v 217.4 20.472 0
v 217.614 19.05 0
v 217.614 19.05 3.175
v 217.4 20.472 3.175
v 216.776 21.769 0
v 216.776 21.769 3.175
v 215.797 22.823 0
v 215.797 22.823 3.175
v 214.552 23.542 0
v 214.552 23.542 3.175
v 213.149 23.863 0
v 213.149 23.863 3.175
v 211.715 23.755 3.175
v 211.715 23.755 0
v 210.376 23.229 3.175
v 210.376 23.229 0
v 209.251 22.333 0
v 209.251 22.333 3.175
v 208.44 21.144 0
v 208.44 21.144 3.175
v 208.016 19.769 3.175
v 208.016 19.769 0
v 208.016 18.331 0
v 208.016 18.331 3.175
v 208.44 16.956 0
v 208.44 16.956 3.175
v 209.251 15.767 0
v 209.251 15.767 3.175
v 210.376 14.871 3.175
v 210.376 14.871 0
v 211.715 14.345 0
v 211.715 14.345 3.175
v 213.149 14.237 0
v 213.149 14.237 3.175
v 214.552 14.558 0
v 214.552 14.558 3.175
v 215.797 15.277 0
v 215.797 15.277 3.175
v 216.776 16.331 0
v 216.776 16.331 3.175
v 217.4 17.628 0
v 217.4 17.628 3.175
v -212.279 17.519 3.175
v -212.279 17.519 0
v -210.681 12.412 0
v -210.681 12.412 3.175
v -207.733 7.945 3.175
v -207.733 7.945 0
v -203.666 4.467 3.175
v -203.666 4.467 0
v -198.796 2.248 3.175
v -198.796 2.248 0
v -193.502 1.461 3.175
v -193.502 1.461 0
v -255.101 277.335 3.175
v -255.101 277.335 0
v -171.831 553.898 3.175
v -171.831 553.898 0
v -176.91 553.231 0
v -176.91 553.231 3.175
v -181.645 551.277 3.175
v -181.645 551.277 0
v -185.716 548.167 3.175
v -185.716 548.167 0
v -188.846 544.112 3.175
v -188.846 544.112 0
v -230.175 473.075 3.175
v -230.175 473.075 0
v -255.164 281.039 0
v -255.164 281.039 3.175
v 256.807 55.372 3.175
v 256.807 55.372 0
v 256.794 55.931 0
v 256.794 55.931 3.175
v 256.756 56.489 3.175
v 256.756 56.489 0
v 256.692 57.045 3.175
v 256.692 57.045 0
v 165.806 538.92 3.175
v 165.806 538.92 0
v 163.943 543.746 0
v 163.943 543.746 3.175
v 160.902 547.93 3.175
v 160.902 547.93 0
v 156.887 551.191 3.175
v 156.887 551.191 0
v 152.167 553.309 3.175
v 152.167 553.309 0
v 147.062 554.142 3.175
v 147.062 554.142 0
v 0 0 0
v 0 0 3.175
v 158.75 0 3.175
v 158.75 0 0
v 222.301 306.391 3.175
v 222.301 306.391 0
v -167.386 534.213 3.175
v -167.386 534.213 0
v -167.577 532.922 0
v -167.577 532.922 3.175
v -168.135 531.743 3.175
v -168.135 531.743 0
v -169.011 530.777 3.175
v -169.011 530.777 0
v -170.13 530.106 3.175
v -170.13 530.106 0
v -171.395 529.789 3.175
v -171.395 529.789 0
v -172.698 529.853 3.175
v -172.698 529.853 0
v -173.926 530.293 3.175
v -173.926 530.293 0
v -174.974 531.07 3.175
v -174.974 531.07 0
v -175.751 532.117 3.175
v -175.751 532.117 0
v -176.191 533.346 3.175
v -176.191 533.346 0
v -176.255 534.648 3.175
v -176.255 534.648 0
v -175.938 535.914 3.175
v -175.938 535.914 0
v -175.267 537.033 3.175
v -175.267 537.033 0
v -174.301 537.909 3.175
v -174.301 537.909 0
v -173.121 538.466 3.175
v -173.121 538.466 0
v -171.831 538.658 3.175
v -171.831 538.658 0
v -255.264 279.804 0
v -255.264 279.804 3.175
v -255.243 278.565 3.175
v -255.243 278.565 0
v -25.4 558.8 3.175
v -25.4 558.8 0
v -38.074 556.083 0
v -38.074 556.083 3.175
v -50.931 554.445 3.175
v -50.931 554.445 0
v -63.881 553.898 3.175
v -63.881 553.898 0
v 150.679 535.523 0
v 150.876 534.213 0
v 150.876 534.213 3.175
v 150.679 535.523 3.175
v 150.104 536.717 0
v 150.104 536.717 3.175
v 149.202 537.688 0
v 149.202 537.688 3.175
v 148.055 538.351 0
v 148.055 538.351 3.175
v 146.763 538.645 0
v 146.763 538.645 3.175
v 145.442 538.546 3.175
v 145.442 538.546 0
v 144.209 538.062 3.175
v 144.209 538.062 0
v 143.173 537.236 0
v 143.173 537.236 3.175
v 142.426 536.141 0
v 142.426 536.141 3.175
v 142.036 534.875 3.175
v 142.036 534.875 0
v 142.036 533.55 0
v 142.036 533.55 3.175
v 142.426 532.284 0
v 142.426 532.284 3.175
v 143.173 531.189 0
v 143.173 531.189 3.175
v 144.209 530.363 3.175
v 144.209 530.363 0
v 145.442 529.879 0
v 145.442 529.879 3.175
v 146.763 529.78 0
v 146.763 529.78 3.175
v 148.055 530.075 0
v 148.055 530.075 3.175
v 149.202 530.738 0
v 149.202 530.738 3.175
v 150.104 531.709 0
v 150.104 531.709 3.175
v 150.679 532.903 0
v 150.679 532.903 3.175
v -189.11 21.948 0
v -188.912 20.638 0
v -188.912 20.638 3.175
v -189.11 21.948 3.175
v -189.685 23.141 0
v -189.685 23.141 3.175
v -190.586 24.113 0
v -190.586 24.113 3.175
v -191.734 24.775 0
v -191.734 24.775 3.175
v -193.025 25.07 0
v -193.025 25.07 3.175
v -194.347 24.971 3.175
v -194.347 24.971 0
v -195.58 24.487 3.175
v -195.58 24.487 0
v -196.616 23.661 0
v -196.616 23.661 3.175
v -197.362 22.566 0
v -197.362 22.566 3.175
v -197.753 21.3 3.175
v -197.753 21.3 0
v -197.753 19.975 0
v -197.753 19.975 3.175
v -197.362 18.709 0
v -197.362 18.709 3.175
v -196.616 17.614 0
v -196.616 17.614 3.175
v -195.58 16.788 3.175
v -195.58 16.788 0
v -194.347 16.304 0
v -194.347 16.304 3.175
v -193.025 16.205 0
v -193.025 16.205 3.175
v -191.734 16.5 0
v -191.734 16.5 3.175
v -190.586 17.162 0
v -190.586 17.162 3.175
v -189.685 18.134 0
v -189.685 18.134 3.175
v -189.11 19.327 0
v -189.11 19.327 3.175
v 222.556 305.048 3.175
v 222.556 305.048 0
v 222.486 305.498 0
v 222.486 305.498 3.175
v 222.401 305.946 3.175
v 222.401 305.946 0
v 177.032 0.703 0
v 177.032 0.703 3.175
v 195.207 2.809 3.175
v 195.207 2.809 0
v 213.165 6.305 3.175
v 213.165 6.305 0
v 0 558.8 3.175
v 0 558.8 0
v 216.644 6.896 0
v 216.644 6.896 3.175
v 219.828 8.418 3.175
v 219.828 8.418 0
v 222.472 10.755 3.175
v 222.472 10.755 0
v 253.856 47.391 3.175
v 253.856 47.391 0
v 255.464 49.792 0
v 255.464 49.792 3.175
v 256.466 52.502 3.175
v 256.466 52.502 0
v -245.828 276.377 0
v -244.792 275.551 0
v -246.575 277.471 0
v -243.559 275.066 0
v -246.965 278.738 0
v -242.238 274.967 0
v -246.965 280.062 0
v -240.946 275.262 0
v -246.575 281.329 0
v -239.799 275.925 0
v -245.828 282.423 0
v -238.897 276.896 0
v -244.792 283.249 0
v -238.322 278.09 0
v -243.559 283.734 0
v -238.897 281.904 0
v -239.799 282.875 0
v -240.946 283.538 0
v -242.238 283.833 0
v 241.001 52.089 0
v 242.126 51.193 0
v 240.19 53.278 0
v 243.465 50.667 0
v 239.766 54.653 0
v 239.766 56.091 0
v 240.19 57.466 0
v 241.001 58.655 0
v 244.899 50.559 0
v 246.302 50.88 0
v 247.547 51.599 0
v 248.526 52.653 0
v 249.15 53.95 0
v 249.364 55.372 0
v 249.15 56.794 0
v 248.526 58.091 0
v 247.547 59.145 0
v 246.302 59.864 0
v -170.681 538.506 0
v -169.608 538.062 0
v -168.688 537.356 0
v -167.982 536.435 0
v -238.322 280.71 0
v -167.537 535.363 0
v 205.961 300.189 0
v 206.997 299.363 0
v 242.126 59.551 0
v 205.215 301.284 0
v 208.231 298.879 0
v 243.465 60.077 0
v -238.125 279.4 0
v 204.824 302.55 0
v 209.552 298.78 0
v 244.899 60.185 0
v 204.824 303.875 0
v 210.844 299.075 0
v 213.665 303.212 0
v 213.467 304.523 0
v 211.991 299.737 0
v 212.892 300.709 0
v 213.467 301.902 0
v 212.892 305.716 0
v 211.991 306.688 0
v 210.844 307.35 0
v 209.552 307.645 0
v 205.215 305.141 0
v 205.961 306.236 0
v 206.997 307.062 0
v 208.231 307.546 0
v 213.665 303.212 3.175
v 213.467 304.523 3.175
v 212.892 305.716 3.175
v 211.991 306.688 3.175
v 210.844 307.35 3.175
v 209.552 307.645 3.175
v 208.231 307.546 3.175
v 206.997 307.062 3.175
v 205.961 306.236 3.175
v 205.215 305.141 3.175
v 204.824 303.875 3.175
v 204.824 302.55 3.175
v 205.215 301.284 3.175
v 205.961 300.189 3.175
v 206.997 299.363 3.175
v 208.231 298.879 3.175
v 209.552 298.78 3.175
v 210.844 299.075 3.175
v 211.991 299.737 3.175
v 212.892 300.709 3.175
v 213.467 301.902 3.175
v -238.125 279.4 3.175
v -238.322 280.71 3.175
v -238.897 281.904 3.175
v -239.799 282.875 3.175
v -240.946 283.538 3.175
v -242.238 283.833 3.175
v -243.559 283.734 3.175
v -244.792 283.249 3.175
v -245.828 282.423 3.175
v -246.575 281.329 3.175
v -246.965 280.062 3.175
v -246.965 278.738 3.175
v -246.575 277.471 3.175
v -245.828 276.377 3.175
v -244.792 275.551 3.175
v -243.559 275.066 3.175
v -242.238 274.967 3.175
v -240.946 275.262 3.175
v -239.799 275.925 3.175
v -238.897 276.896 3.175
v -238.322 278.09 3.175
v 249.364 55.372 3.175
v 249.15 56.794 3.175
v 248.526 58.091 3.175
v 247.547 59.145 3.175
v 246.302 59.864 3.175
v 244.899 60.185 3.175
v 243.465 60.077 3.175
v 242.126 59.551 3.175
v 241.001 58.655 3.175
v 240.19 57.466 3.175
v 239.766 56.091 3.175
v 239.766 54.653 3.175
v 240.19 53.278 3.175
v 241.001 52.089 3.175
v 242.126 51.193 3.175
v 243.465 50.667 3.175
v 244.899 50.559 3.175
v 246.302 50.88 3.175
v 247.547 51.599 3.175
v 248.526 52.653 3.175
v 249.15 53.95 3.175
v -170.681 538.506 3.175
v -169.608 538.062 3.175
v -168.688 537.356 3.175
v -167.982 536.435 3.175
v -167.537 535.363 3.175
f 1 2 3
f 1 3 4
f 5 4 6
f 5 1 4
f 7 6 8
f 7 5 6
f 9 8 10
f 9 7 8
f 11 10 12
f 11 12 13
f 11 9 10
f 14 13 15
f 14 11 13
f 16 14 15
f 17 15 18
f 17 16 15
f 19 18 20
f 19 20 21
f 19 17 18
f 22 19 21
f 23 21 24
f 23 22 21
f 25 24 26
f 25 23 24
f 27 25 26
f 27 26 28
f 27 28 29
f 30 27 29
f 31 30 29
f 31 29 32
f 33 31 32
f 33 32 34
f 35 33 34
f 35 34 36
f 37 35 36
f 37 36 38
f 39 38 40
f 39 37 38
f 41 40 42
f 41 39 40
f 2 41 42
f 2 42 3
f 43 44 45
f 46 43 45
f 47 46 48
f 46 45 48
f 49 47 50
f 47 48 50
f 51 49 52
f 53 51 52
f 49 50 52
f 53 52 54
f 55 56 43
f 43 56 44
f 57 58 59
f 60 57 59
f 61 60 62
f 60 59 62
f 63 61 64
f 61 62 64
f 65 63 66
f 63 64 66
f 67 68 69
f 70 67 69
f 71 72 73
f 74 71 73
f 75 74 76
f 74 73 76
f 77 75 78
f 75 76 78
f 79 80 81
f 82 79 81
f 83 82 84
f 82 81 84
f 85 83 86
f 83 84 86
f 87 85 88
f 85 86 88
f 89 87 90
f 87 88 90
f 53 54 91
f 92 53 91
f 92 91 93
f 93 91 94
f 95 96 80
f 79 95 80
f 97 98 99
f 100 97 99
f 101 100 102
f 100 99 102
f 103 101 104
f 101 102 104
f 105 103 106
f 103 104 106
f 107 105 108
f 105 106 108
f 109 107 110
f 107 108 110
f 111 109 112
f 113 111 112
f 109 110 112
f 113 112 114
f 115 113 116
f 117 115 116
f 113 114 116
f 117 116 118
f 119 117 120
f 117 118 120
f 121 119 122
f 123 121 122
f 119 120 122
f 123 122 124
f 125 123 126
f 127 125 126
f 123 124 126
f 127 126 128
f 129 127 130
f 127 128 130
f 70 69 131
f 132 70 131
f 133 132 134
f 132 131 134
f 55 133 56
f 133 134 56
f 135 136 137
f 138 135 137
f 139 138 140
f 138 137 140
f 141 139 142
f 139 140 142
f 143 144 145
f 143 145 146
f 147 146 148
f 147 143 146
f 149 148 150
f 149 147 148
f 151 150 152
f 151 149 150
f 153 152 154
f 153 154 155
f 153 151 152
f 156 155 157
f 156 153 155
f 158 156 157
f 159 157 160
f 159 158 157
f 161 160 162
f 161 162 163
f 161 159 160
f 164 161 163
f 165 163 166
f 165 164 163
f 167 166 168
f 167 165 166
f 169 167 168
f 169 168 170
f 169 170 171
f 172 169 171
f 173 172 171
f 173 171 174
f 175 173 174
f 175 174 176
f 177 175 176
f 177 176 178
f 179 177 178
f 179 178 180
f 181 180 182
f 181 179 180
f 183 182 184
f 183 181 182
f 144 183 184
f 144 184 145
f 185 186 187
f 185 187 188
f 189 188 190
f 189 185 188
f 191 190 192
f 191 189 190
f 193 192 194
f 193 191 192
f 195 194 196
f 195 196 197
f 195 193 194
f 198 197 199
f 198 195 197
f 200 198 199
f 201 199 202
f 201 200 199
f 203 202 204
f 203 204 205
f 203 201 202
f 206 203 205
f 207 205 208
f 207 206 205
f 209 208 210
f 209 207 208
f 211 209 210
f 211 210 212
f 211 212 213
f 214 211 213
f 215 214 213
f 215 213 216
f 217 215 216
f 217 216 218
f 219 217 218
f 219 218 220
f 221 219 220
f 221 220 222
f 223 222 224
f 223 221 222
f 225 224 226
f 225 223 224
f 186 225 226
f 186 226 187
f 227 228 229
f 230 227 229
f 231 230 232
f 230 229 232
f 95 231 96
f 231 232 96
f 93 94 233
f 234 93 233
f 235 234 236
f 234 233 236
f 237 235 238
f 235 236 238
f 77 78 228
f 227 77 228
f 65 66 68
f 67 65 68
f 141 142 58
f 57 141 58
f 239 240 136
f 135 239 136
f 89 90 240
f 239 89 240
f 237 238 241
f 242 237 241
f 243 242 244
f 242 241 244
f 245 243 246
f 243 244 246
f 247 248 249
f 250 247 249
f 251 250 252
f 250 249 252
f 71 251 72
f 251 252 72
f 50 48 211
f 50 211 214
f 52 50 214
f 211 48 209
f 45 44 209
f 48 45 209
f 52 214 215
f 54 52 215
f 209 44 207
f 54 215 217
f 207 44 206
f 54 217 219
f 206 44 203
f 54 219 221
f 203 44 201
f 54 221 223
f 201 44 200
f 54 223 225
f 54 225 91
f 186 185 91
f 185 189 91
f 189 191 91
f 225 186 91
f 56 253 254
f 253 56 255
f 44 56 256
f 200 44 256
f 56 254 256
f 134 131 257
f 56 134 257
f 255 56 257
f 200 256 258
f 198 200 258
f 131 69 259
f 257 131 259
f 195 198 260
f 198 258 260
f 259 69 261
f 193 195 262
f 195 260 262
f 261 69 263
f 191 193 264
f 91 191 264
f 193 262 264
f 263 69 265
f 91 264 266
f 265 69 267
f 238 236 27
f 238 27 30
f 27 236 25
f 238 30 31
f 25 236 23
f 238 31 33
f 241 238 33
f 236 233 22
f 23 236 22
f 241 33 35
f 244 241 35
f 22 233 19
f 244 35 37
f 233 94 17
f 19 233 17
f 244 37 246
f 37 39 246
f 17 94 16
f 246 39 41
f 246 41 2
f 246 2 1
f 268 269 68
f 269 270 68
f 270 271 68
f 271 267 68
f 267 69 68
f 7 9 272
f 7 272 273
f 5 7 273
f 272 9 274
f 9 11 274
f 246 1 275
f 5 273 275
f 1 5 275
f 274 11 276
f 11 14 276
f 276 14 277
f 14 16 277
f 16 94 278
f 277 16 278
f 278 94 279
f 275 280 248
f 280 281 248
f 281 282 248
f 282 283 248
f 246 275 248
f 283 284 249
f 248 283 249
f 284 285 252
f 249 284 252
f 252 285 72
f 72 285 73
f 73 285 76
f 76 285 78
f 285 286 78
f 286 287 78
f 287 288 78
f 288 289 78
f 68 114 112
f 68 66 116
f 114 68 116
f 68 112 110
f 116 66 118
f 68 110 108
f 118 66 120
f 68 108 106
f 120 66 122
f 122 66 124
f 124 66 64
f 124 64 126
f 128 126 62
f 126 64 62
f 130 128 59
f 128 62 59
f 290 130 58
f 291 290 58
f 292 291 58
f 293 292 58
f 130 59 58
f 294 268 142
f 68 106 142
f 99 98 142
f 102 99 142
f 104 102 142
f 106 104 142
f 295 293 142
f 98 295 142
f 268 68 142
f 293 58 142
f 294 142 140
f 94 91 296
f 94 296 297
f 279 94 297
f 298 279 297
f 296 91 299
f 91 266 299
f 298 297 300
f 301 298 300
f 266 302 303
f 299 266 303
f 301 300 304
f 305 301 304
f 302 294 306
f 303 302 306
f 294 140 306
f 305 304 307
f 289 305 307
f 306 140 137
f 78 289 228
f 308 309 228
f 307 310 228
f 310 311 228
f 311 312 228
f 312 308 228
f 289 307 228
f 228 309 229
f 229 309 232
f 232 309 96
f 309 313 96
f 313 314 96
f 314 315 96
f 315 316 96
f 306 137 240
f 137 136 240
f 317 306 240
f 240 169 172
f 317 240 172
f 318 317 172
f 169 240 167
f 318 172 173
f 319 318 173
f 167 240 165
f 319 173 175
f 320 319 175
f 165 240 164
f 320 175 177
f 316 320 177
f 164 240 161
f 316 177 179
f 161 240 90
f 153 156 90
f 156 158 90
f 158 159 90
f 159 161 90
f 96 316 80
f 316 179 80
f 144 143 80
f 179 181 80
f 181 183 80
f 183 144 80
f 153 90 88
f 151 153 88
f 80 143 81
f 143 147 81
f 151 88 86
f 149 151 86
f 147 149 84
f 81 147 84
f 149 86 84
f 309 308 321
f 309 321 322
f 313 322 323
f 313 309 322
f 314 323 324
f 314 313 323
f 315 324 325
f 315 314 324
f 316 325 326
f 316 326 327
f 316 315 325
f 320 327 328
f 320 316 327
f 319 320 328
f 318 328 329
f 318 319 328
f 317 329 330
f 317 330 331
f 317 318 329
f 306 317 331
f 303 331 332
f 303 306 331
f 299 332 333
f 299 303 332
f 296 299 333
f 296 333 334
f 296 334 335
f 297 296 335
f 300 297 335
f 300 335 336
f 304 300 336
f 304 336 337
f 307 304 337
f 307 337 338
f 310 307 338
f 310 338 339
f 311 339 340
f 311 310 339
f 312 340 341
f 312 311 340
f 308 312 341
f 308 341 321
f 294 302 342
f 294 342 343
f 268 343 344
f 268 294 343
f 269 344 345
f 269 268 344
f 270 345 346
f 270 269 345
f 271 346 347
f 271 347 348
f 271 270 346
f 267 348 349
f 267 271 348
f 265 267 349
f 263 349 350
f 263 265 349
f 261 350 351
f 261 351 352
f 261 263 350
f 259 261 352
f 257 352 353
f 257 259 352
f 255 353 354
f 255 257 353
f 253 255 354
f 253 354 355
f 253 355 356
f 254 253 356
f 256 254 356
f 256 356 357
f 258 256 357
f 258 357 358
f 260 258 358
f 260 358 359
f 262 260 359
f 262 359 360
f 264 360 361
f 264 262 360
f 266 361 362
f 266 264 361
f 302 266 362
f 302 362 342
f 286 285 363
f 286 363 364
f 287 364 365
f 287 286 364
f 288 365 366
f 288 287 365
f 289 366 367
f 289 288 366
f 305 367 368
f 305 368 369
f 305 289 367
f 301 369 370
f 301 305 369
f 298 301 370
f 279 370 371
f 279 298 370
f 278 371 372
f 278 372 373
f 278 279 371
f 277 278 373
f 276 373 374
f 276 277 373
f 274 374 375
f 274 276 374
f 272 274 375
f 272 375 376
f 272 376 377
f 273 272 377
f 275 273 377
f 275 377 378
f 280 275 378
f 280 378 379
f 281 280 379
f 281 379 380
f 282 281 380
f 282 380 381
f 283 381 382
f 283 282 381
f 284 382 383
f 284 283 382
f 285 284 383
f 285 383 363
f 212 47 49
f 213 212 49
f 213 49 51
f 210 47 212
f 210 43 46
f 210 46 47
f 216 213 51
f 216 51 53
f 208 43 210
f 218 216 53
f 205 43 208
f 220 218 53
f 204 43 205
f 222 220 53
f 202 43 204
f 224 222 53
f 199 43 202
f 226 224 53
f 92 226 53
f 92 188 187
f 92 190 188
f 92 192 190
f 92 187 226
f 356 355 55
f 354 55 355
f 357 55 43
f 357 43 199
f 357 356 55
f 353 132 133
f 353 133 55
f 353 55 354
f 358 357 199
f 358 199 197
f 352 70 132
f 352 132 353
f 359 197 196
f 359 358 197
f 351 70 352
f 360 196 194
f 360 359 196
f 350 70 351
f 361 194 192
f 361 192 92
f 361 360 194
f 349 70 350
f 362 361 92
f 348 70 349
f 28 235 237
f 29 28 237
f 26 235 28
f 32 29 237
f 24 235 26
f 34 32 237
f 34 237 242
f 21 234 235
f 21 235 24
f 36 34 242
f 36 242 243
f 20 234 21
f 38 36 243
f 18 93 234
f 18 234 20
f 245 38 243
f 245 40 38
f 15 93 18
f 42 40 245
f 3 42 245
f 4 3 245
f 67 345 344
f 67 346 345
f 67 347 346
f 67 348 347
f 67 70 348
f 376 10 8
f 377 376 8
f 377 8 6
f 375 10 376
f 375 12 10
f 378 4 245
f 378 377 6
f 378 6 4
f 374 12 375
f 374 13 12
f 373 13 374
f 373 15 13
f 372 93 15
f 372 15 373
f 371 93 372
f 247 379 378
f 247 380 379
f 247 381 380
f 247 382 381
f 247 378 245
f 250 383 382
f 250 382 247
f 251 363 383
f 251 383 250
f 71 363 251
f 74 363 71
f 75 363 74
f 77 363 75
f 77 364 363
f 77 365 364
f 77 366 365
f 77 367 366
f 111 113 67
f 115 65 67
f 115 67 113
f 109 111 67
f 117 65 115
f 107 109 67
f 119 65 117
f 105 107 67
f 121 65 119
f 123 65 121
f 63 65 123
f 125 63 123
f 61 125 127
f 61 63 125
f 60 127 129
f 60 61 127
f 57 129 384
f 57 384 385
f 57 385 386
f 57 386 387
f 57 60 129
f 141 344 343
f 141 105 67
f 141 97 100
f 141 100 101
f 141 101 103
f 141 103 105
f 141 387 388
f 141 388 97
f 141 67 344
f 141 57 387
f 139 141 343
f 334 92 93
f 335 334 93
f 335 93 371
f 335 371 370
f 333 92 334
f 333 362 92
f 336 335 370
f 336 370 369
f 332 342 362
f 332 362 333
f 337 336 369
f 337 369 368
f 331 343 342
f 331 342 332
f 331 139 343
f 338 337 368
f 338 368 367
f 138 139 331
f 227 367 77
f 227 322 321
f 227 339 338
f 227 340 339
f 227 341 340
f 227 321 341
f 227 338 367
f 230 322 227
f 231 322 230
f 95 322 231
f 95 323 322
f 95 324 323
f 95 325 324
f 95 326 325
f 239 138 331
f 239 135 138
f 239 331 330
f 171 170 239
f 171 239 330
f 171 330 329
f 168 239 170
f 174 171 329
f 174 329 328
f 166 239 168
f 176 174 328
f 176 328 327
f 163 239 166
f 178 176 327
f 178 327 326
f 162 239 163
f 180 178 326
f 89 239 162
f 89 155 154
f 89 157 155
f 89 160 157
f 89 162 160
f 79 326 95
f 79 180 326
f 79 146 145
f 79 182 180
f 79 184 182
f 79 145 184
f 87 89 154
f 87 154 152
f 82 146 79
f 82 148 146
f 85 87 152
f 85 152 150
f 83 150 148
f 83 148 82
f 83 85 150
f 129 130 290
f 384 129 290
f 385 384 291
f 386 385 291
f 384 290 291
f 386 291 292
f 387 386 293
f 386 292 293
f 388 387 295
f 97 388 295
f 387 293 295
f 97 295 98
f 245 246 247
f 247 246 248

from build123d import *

# Parameters (mm, degrees)
F0_R     = 4.445
F0_R_2   = 4.826
F1_DEPTH = 3.175


with BuildPart() as f1:
    # F0 (on Top) → F1 (new body)
    with BuildSketch(Plane.XY):
        with BuildLine():
            Line((-63.881, 553.8978), (-171.831, 553.8978))
            ThreePointArc((-171.831, 553.8978), (-157.911603, 548.132197), (-152.146, 534.2128))
            ThreePointArc((-152.146, 534.2128), (-176.957475, 515.207052), (-188.845871, 544.111962))
            Line((-188.845871, 544.111962), (-230.1748, 473.075))
            Line((-230.1748, 473.075), (-255.163822, 281.038792))
            ThreePointArc((-255.163822, 281.038792), (-241.748886, 292.073428), (-229.87, 279.4))
            ThreePointArc((-229.87, 279.4), (-241.533898, 266.742335), (-255.100944, 277.334704))
            Line((-255.100944, 277.334704), (-212.279225, 17.518903))
            ThreePointArc((-212.279225, 17.518903), (-194.922014, 39.750575), (-174.1805, 20.6375))
            ThreePointArc((-174.1805, 20.6375), (-179.848602, 7.026218), (-193.502293, 1.461047))
            Line((-193.502293, 1.461047), (0, 0))
            Line((0, 0), (158.75, 0))
            ThreePointArc((158.75, 0), (186.139747, 1.581448), (213.165464, 6.304773))
            ThreePointArc((213.165464, 6.304773), (203.640017, 27.9319), (225.5393, 19.05))
            ThreePointArc((225.5393, 19.05), (224.747937, 14.627924), (222.472079, 10.754749))
            Line((222.472079, 10.754749), (253.855569, 47.390713))
            ThreePointArc((253.855569, 47.390713), (232.76785, 58.830401), (256.692111, 57.044866))
            Line((256.692111, 57.044866), (222.55606, 305.04815))
            ThreePointArc((222.55606, 305.04815), (222.650328, 304.132476), (222.6818, 303.2125))
            ThreePointArc((222.6818, 303.2125), (195.853277, 301.612028), (222.301246, 306.390742))
            Line((222.301246, 306.390742), (165.806349, 538.920196))
            ThreePointArc((165.806349, 538.920196), (166.228586, 536.583311), (166.37, 534.2128))
            ThreePointArc((166.37, 534.2128), (132.110556, 520.338774), (147.062251, 554.141805))
            Line((147.062251, 554.141805), (0, 558.8))
            Line((0, 558.8), (-25.4, 558.8))
            ThreePointArc((-25.4, 558.8), (-44.485002, 555.128282), (-63.881, 553.8978))
        make_face()
        with BuildLine():
            ThreePointArc((-174.1805, 20.6375), (-194.922014, 39.750575), (-212.279225, 17.518903))
            ThreePointArc((-212.279225, 17.518903), (-205.821316, 6.063186), (-193.502293, 1.461047))
            ThreePointArc((-193.502293, 1.461047), (-179.848602, 7.026218), (-174.1805, 20.6375))
        make_face()
        with Locations((-193.3575, 20.6375)):
            Circle(F0_R, mode=Mode.SUBTRACT)
        with BuildLine():
            ThreePointArc((-229.87, 279.4), (-241.748886, 292.073428), (-255.163822, 281.038792))
            ThreePointArc((-255.163822, 281.038792), (-255.268171, 279.184443), (-255.100944, 277.334704))
            ThreePointArc((-255.100944, 277.334704), (-241.533898, 266.742335), (-229.87, 279.4))
        make_face()
        with Locations((-242.57, 279.4)):
            Circle(F0_R, mode=Mode.SUBTRACT)
        with BuildLine():
            ThreePointArc((222.55606, 305.04815), (222.4457, 305.722682), (222.301246, 306.390742))
            ThreePointArc((222.301246, 306.390742), (195.853277, 301.612028), (222.6818, 303.2125))
            ThreePointArc((222.6818, 303.2125), (222.650328, 304.132476), (222.55606, 305.04815))
        make_face()
        with Locations((209.2198, 303.2125)):
            Circle(F0_R, mode=Mode.SUBTRACT)
        with BuildLine():
            ThreePointArc((256.8067, 55.372), (256.778019, 56.210393), (256.692111, 57.044866))
            ThreePointArc((256.692111, 57.044866), (232.76785, 58.830401), (253.855569, 47.390713))
            ThreePointArc((253.855569, 47.390713), (256.045289, 51.117293), (256.8067, 55.372))
        make_face()
        with Locations((244.5385, 55.372)):
            Circle(F0_R_2, mode=Mode.SUBTRACT)
        with BuildLine():
            ThreePointArc((225.5393, 19.05), (203.640017, 27.9319), (213.165464, 6.304773))
            ThreePointArc((213.165464, 6.304773), (218.288882, 7.546579), (222.472079, 10.754749))
            ThreePointArc((222.472079, 10.754749), (224.747937, 14.627924), (225.5393, 19.05))
        make_face()
        with Locations((212.7885, 19.05)):
            Circle(F0_R_2, mode=Mode.SUBTRACT)
        with BuildLine():
            ThreePointArc((165.806349, 538.920196), (159.000421, 549.690958), (147.062251, 554.141805))
            ThreePointArc((147.062251, 554.141805), (132.110556, 520.338774), (166.37, 534.2128))
            ThreePointArc((166.37, 534.2128), (166.228586, 536.583311), (165.806349, 538.920196))
        make_face()
        with Locations((146.431, 534.2128)):
            Circle(F0_R, mode=Mode.SUBTRACT)
        with BuildLine():
            ThreePointArc((-152.146, 534.2128), (-157.911603, 548.132197), (-171.831, 553.8978))
            ThreePointArc((-171.831, 553.8978), (-181.645128, 551.276859), (-188.845871, 544.111962))
            ThreePointArc((-188.845871, 544.111962), (-176.957475, 515.207052), (-152.146, 534.2128))
        make_face()
        with BuildLine():
            ThreePointArc((-171.831, 538.6578), (-168.68791, 537.35589), (-167.386, 534.2128))
            ThreePointArc((-167.386, 534.2128), (-174.97409, 531.06971), (-171.831, 538.6578))
        make_face(mode=Mode.SUBTRACT)
    extrude(amount=F1_DEPTH)


solid = f1.part
